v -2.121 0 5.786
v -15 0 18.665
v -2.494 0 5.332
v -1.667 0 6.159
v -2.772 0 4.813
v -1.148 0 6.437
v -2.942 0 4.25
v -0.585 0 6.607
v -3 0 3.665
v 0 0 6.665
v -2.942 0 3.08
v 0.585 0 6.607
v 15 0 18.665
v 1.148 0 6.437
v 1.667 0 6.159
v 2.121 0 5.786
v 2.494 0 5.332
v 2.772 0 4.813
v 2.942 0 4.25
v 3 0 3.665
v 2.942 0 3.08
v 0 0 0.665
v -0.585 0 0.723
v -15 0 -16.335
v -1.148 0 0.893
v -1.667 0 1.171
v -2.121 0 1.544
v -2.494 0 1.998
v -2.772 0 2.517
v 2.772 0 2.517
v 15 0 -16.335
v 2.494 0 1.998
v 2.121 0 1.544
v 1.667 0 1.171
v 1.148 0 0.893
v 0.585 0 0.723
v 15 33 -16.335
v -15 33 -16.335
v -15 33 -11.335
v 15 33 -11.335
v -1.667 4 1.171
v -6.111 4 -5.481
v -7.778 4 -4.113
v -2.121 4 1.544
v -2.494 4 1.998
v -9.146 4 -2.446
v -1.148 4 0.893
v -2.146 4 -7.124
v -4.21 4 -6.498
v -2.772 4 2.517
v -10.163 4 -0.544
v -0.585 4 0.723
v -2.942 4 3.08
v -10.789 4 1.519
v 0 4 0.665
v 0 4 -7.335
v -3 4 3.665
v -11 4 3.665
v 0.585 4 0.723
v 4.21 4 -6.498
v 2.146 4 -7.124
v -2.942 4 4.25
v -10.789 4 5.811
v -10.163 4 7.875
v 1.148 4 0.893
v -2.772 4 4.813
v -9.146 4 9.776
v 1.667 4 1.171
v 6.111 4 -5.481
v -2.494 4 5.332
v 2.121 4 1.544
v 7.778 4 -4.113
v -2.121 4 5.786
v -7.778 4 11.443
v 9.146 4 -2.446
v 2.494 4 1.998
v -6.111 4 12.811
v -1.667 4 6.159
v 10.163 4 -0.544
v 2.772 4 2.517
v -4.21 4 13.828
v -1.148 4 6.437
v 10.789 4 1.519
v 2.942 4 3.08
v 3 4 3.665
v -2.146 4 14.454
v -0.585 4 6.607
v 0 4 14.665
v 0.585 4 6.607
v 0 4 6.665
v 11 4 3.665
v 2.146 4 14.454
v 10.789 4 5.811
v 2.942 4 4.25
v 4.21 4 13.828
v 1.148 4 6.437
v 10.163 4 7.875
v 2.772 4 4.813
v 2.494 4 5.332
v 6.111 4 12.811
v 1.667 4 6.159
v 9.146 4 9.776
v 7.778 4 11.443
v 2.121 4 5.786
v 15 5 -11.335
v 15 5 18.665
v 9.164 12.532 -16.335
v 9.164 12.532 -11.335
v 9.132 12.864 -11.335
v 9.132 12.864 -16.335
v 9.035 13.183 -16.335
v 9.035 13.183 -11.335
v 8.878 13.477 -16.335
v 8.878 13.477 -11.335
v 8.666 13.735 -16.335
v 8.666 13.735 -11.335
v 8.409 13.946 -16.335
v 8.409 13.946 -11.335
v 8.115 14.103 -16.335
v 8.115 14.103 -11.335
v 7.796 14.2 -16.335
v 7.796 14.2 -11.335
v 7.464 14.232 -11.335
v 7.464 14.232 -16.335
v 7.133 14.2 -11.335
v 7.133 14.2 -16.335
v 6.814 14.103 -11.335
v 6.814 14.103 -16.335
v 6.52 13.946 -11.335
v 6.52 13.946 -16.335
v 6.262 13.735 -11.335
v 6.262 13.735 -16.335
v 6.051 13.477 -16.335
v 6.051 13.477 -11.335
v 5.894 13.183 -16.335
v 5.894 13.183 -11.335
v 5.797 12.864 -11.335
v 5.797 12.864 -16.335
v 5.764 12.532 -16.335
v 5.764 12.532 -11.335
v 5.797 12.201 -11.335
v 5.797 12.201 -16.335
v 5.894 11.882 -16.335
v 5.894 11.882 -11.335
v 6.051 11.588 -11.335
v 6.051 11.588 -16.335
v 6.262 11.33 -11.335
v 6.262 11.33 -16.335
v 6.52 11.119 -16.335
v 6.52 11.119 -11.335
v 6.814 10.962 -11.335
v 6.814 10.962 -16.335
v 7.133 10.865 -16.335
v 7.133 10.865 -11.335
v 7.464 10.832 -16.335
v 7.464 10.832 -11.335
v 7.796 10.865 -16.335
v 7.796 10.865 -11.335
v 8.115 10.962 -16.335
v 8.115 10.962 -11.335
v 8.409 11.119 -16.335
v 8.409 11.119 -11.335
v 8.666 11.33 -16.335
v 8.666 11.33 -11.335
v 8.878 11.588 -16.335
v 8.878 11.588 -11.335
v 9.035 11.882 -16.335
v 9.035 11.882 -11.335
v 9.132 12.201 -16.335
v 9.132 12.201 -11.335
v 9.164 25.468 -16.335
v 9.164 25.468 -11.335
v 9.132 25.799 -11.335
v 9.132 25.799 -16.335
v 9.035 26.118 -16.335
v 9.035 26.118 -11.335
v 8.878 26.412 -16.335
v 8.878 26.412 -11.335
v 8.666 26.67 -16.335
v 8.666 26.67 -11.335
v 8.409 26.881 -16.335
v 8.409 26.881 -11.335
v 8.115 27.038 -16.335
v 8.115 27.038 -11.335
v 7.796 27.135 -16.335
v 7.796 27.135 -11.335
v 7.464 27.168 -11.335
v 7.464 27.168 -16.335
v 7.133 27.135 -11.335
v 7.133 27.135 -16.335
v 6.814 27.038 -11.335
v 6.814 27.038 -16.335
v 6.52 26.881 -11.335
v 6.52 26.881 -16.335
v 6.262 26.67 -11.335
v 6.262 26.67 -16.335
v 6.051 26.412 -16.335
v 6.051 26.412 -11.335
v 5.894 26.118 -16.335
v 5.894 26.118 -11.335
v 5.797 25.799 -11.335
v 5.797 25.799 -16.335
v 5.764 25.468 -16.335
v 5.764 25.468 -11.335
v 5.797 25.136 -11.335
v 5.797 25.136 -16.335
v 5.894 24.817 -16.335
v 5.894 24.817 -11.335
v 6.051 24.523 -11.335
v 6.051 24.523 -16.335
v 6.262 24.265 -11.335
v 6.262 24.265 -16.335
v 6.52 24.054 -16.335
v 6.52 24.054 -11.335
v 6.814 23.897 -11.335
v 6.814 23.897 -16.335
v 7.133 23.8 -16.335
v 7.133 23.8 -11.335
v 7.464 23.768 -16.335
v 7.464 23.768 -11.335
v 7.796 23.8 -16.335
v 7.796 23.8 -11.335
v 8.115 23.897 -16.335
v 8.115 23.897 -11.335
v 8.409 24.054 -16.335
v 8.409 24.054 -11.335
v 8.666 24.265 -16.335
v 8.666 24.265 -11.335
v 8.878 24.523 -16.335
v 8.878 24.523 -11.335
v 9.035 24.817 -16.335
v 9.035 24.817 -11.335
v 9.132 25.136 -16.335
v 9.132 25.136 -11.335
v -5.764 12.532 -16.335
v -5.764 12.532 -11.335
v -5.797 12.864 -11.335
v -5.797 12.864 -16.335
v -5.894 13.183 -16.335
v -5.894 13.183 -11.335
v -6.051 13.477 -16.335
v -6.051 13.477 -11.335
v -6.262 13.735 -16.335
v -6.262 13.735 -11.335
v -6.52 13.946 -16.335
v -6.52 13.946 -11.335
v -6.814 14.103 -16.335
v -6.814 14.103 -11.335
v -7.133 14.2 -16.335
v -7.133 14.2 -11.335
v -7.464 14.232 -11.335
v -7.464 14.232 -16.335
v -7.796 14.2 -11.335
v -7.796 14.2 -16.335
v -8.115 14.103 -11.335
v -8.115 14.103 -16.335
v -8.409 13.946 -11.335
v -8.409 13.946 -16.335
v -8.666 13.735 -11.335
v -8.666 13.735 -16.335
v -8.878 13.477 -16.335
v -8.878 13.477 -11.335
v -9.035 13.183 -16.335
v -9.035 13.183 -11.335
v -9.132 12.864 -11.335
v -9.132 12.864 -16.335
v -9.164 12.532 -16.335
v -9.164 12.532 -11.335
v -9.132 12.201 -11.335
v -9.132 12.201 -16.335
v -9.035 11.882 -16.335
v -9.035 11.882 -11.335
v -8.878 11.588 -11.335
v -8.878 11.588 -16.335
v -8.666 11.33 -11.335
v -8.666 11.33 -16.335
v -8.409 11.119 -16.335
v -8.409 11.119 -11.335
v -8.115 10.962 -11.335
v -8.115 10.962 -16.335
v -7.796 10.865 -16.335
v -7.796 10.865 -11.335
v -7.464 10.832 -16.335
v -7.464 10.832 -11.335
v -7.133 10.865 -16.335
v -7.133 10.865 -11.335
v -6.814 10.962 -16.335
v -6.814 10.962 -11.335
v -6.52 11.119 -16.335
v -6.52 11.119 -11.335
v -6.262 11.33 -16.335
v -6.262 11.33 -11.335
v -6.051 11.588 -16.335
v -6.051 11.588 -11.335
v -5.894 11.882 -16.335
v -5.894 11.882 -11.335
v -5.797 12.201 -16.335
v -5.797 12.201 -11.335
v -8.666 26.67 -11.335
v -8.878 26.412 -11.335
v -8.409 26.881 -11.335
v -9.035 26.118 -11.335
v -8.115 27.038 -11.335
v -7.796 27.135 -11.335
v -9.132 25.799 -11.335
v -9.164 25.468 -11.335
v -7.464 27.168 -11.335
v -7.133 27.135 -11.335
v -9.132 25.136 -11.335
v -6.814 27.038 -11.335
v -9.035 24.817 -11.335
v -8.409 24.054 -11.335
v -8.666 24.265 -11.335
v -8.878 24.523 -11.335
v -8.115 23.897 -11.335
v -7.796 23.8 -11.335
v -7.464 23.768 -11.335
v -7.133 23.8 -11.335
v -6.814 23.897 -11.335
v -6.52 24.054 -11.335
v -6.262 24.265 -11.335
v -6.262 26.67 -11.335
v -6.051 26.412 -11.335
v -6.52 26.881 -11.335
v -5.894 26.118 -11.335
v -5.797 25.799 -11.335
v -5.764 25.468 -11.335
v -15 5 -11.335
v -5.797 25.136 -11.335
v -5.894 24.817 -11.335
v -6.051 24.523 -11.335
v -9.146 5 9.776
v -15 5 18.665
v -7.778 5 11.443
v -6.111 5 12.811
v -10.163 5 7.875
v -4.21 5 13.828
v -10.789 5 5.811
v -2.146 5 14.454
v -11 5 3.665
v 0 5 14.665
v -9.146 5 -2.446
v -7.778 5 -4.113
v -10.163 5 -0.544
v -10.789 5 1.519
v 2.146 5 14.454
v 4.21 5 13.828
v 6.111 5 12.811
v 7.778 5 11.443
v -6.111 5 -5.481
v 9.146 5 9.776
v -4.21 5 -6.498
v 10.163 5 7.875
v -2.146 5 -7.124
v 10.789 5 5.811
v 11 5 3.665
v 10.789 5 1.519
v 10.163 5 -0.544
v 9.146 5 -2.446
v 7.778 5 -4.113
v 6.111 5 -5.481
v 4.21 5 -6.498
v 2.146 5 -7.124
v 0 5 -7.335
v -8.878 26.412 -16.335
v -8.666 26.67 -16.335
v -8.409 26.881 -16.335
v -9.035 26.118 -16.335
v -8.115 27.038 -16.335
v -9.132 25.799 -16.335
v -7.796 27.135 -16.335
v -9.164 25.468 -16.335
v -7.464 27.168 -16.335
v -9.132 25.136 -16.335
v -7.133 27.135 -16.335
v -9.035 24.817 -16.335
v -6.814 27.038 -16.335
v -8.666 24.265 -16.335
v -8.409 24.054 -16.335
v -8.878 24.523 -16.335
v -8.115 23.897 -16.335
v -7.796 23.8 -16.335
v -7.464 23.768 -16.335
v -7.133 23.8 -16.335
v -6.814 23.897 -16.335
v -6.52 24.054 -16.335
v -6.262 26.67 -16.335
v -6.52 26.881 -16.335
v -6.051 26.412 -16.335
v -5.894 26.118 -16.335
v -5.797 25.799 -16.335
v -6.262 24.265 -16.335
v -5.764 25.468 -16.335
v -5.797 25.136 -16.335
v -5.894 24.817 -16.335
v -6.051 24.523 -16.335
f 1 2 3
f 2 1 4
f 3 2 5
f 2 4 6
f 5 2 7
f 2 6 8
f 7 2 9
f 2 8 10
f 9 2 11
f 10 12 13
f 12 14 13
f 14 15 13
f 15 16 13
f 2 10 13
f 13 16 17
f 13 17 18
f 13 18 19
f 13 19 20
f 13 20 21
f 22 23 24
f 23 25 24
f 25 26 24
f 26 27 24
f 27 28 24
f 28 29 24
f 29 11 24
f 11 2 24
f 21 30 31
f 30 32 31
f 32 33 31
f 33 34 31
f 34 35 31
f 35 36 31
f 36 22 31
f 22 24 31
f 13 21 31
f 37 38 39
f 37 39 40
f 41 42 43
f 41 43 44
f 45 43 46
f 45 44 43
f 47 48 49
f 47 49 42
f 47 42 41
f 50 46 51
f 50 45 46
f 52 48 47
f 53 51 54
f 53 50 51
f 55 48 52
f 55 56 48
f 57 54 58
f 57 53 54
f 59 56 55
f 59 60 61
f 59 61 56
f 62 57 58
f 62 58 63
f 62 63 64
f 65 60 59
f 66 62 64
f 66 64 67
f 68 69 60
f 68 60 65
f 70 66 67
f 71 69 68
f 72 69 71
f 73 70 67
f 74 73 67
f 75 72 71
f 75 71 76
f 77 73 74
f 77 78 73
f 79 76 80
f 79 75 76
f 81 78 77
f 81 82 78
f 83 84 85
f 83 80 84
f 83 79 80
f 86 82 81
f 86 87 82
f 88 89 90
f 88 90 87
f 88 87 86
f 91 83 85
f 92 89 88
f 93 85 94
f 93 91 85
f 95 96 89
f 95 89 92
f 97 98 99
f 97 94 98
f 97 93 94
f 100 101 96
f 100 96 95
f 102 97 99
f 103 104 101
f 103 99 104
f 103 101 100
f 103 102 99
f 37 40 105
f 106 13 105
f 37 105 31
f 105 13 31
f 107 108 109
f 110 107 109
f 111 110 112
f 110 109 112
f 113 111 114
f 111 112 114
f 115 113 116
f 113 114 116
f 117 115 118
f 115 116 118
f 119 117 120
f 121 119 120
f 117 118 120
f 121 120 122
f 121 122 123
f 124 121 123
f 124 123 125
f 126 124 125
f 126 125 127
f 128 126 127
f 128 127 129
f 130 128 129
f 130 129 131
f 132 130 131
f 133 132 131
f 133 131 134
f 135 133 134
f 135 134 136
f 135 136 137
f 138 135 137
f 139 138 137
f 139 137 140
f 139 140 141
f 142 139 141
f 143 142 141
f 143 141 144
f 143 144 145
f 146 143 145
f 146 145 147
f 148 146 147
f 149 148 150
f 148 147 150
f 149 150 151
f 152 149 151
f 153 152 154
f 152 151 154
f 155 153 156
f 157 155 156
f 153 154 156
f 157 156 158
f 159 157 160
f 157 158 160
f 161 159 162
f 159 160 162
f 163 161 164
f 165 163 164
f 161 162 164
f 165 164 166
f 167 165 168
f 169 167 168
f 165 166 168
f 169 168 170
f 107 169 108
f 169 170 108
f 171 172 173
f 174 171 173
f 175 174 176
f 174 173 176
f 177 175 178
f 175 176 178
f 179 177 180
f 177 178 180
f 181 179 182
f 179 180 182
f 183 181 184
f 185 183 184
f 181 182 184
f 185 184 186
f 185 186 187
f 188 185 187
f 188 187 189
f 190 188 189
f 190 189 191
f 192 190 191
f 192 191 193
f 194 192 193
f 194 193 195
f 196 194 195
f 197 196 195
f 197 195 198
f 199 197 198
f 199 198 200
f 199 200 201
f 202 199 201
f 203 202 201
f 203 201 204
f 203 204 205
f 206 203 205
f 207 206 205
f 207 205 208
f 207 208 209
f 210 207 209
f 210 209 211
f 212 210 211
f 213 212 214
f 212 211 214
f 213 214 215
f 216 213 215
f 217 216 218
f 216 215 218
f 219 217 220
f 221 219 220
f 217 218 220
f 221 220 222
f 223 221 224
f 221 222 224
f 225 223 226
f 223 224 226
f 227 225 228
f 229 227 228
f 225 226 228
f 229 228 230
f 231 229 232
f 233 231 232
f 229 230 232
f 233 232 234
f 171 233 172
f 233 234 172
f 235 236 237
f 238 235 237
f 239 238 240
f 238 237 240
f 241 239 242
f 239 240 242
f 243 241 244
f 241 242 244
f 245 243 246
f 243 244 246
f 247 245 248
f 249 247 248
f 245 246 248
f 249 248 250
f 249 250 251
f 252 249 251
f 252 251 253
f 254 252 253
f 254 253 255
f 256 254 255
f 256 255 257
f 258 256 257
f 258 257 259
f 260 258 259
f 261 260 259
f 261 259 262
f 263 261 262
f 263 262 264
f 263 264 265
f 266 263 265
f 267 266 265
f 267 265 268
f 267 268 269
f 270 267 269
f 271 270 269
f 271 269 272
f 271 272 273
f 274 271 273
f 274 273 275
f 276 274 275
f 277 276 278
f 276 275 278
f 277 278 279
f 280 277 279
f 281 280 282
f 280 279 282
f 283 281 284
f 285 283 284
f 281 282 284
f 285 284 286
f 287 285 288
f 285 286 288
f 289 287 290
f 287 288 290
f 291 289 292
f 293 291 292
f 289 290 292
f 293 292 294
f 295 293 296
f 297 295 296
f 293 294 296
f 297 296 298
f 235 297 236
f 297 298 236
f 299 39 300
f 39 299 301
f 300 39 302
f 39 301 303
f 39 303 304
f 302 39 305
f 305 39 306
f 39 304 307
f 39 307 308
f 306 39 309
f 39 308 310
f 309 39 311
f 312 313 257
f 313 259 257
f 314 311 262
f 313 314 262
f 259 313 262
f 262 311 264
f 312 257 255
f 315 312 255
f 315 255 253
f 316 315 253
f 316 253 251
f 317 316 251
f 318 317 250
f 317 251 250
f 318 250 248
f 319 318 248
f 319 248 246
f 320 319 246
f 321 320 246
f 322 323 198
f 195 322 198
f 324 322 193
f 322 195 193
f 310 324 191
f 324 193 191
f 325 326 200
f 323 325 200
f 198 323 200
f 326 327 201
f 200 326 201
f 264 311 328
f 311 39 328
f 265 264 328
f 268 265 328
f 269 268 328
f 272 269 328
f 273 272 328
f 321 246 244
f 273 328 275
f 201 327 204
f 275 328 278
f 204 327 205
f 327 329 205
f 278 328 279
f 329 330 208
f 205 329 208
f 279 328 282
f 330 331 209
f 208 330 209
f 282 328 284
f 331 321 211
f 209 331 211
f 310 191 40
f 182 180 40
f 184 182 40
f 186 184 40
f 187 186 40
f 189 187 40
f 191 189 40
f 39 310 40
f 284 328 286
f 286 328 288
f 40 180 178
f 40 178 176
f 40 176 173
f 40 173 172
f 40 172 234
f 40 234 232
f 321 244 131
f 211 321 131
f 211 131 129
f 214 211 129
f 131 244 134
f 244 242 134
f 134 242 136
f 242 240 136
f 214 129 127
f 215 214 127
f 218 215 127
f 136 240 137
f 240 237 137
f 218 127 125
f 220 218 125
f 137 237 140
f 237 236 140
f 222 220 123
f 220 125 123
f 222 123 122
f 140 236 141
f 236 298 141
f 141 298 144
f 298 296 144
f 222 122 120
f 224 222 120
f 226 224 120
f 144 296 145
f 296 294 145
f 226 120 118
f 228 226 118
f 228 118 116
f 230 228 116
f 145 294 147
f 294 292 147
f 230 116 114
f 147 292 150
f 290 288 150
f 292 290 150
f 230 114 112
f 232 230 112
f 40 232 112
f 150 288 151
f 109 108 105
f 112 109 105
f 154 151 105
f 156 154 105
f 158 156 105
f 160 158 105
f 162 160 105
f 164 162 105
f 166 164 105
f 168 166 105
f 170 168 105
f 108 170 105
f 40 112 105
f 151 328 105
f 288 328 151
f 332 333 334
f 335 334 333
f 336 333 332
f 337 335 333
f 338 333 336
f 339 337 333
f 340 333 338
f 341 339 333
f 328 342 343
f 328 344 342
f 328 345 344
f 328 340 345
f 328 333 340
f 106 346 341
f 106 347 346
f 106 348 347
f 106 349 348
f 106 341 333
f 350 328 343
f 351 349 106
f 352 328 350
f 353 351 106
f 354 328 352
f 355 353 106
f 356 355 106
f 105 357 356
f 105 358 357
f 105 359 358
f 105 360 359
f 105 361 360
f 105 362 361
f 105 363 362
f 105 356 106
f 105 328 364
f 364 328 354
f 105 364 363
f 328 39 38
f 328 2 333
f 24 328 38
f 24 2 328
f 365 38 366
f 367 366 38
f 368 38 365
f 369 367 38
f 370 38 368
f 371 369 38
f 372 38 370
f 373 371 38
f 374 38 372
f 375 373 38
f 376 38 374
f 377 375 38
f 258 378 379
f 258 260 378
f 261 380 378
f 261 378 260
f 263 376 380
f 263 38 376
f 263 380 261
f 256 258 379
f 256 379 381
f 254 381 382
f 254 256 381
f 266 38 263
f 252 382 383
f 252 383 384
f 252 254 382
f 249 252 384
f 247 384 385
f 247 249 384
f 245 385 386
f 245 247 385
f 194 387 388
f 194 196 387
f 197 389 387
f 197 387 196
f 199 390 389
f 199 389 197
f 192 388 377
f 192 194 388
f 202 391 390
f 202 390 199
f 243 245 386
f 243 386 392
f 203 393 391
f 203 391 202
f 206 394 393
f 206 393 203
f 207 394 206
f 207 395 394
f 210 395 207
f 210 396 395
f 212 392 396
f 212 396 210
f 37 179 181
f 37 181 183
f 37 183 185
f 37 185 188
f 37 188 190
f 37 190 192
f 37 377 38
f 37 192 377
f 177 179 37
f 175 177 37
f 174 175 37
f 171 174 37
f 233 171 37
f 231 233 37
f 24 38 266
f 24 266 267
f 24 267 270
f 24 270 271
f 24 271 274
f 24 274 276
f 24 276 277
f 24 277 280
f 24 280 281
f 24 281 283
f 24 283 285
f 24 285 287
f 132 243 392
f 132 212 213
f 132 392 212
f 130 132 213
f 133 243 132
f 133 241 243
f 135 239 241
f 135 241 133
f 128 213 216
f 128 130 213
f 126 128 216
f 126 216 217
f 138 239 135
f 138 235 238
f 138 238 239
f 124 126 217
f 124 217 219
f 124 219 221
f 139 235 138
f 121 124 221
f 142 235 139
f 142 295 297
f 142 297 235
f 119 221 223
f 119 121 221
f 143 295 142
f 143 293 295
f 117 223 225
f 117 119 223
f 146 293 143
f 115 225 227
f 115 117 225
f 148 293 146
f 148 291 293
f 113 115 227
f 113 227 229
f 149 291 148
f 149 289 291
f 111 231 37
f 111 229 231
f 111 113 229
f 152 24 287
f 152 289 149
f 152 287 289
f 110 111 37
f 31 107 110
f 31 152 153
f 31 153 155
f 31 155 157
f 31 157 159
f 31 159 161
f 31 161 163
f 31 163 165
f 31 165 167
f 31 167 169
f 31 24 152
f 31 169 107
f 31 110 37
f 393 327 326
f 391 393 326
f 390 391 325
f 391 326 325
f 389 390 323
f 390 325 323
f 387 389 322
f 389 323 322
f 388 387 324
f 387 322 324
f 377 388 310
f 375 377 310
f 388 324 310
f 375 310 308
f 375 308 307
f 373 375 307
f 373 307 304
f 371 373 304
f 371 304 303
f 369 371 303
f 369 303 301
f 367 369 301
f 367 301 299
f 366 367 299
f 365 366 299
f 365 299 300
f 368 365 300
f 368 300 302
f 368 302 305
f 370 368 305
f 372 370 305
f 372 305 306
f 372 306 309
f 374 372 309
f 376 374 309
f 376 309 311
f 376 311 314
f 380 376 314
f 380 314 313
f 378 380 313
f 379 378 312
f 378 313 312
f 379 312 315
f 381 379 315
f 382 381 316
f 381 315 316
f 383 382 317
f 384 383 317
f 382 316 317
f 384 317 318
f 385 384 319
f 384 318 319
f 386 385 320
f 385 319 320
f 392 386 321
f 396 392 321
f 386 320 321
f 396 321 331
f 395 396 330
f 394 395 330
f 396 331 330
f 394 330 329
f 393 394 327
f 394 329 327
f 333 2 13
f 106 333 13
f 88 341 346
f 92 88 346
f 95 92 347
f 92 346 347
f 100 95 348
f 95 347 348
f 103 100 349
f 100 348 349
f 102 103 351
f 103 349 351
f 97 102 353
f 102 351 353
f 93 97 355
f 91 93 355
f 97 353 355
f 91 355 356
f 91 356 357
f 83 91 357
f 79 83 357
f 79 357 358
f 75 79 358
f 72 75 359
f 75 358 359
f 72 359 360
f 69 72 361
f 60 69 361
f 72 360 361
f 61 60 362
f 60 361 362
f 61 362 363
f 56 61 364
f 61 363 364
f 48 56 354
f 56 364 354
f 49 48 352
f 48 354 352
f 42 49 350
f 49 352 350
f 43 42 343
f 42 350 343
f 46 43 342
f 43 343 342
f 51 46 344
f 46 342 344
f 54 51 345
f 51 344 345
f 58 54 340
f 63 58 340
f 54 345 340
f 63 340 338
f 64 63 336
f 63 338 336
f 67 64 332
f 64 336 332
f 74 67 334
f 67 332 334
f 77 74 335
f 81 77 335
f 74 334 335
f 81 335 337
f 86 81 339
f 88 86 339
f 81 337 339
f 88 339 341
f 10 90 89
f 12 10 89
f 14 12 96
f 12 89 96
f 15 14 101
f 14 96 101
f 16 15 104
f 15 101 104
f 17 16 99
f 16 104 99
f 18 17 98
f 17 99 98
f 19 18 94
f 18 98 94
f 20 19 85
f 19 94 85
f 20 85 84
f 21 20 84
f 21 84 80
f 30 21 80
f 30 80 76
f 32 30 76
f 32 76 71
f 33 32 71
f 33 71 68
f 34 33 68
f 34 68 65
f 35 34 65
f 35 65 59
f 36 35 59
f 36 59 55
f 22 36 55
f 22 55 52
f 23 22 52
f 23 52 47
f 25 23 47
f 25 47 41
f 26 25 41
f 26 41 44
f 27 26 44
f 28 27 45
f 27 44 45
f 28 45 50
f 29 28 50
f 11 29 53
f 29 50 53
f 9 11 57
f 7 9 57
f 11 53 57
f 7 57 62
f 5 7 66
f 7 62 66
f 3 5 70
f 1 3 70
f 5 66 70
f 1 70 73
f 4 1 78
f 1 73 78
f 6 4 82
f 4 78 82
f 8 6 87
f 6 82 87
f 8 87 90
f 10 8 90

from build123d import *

# Parameters (mm, degrees)
SKETCH1_W           = 30
SKETCH1_H           = 30
BOSS_EXTRUDE1_DEPTH = 5
SKETCH2_R           = 11
CUT_EXTRUDE1_DEPTH  = 1
SKETCH5_W           = 30
SKETCH5_H           = 5
BOSS_EXTRUDE3_DEPTH = 33
SKETCH6_R           = 1.7
CUT_EXTRUDE2_DEPTH  = 9.378
SKETCH7_R           = 3
CUT_EXTRUDE3_DEPTH  = 9.378


with BuildPart() as part:
    # Sketch1 → Boss-Extrude1 (new body)
    with BuildSketch(Plane(origin=(0, 0, 0), x_dir=(1, 0, 0), z_dir=(0, 1, 0))):
        with Locations((0, -3.665024631)):
            Rectangle(SKETCH1_W, SKETCH1_H)
    extrude(amount=BOSS_EXTRUDE1_DEPTH)

    # Sketch2 → Cut-Extrude1 (cut)
    with BuildSketch(Plane(origin=(0, 5, 0), x_dir=(1, 0, 0), z_dir=(0, 1, 0))):
        with Locations(Location((0, -3.665024631, 0), (0, 0, 270))):
            Circle(SKETCH2_R)
    extrude(amount=-CUT_EXTRUDE1_DEPTH, mode=Mode.SUBTRACT)

    # Sketch5 → Boss-Extrude3 (add)
    with BuildSketch(Plane(origin=(0, 0, 0), x_dir=(1, 0, 0), z_dir=(0, 1, 0))):
        with Locations((0, 13.834975369)):
            Rectangle(SKETCH5_W, SKETCH5_H)
    extrude(amount=BOSS_EXTRUDE3_DEPTH)

    # Sketch6 → Cut-Extrude2 (cut)
    with BuildSketch(Plane.XY.offset(-11.334975369)):
        with Locations((-7.464356525, 12.532459144)):
            Circle(SKETCH6_R)
        with Locations((7.464356525, 12.532459144)):
            Circle(SKETCH6_R)
        with Locations((7.464356525, 25.467540856)):
            Circle(SKETCH6_R)
        with Locations((-7.464356525, 25.467540856)):
            Circle(SKETCH6_R)
    extrude(amount=-CUT_EXTRUDE2_DEPTH, mode=Mode.SUBTRACT)

    # Sketch7 → Cut-Extrude3 (cut)
    with BuildSketch(Plane(origin=(0, 4, 0), x_dir=(1, 0, 0), z_dir=(0, 1, 0))):
        with Locations(Location((0, -3.665024631, 0), (0, 0, 270))):
            Circle(SKETCH7_R)
    extrude(amount=-CUT_EXTRUDE3_DEPTH, mode=Mode.SUBTRACT)


solid = part.part
